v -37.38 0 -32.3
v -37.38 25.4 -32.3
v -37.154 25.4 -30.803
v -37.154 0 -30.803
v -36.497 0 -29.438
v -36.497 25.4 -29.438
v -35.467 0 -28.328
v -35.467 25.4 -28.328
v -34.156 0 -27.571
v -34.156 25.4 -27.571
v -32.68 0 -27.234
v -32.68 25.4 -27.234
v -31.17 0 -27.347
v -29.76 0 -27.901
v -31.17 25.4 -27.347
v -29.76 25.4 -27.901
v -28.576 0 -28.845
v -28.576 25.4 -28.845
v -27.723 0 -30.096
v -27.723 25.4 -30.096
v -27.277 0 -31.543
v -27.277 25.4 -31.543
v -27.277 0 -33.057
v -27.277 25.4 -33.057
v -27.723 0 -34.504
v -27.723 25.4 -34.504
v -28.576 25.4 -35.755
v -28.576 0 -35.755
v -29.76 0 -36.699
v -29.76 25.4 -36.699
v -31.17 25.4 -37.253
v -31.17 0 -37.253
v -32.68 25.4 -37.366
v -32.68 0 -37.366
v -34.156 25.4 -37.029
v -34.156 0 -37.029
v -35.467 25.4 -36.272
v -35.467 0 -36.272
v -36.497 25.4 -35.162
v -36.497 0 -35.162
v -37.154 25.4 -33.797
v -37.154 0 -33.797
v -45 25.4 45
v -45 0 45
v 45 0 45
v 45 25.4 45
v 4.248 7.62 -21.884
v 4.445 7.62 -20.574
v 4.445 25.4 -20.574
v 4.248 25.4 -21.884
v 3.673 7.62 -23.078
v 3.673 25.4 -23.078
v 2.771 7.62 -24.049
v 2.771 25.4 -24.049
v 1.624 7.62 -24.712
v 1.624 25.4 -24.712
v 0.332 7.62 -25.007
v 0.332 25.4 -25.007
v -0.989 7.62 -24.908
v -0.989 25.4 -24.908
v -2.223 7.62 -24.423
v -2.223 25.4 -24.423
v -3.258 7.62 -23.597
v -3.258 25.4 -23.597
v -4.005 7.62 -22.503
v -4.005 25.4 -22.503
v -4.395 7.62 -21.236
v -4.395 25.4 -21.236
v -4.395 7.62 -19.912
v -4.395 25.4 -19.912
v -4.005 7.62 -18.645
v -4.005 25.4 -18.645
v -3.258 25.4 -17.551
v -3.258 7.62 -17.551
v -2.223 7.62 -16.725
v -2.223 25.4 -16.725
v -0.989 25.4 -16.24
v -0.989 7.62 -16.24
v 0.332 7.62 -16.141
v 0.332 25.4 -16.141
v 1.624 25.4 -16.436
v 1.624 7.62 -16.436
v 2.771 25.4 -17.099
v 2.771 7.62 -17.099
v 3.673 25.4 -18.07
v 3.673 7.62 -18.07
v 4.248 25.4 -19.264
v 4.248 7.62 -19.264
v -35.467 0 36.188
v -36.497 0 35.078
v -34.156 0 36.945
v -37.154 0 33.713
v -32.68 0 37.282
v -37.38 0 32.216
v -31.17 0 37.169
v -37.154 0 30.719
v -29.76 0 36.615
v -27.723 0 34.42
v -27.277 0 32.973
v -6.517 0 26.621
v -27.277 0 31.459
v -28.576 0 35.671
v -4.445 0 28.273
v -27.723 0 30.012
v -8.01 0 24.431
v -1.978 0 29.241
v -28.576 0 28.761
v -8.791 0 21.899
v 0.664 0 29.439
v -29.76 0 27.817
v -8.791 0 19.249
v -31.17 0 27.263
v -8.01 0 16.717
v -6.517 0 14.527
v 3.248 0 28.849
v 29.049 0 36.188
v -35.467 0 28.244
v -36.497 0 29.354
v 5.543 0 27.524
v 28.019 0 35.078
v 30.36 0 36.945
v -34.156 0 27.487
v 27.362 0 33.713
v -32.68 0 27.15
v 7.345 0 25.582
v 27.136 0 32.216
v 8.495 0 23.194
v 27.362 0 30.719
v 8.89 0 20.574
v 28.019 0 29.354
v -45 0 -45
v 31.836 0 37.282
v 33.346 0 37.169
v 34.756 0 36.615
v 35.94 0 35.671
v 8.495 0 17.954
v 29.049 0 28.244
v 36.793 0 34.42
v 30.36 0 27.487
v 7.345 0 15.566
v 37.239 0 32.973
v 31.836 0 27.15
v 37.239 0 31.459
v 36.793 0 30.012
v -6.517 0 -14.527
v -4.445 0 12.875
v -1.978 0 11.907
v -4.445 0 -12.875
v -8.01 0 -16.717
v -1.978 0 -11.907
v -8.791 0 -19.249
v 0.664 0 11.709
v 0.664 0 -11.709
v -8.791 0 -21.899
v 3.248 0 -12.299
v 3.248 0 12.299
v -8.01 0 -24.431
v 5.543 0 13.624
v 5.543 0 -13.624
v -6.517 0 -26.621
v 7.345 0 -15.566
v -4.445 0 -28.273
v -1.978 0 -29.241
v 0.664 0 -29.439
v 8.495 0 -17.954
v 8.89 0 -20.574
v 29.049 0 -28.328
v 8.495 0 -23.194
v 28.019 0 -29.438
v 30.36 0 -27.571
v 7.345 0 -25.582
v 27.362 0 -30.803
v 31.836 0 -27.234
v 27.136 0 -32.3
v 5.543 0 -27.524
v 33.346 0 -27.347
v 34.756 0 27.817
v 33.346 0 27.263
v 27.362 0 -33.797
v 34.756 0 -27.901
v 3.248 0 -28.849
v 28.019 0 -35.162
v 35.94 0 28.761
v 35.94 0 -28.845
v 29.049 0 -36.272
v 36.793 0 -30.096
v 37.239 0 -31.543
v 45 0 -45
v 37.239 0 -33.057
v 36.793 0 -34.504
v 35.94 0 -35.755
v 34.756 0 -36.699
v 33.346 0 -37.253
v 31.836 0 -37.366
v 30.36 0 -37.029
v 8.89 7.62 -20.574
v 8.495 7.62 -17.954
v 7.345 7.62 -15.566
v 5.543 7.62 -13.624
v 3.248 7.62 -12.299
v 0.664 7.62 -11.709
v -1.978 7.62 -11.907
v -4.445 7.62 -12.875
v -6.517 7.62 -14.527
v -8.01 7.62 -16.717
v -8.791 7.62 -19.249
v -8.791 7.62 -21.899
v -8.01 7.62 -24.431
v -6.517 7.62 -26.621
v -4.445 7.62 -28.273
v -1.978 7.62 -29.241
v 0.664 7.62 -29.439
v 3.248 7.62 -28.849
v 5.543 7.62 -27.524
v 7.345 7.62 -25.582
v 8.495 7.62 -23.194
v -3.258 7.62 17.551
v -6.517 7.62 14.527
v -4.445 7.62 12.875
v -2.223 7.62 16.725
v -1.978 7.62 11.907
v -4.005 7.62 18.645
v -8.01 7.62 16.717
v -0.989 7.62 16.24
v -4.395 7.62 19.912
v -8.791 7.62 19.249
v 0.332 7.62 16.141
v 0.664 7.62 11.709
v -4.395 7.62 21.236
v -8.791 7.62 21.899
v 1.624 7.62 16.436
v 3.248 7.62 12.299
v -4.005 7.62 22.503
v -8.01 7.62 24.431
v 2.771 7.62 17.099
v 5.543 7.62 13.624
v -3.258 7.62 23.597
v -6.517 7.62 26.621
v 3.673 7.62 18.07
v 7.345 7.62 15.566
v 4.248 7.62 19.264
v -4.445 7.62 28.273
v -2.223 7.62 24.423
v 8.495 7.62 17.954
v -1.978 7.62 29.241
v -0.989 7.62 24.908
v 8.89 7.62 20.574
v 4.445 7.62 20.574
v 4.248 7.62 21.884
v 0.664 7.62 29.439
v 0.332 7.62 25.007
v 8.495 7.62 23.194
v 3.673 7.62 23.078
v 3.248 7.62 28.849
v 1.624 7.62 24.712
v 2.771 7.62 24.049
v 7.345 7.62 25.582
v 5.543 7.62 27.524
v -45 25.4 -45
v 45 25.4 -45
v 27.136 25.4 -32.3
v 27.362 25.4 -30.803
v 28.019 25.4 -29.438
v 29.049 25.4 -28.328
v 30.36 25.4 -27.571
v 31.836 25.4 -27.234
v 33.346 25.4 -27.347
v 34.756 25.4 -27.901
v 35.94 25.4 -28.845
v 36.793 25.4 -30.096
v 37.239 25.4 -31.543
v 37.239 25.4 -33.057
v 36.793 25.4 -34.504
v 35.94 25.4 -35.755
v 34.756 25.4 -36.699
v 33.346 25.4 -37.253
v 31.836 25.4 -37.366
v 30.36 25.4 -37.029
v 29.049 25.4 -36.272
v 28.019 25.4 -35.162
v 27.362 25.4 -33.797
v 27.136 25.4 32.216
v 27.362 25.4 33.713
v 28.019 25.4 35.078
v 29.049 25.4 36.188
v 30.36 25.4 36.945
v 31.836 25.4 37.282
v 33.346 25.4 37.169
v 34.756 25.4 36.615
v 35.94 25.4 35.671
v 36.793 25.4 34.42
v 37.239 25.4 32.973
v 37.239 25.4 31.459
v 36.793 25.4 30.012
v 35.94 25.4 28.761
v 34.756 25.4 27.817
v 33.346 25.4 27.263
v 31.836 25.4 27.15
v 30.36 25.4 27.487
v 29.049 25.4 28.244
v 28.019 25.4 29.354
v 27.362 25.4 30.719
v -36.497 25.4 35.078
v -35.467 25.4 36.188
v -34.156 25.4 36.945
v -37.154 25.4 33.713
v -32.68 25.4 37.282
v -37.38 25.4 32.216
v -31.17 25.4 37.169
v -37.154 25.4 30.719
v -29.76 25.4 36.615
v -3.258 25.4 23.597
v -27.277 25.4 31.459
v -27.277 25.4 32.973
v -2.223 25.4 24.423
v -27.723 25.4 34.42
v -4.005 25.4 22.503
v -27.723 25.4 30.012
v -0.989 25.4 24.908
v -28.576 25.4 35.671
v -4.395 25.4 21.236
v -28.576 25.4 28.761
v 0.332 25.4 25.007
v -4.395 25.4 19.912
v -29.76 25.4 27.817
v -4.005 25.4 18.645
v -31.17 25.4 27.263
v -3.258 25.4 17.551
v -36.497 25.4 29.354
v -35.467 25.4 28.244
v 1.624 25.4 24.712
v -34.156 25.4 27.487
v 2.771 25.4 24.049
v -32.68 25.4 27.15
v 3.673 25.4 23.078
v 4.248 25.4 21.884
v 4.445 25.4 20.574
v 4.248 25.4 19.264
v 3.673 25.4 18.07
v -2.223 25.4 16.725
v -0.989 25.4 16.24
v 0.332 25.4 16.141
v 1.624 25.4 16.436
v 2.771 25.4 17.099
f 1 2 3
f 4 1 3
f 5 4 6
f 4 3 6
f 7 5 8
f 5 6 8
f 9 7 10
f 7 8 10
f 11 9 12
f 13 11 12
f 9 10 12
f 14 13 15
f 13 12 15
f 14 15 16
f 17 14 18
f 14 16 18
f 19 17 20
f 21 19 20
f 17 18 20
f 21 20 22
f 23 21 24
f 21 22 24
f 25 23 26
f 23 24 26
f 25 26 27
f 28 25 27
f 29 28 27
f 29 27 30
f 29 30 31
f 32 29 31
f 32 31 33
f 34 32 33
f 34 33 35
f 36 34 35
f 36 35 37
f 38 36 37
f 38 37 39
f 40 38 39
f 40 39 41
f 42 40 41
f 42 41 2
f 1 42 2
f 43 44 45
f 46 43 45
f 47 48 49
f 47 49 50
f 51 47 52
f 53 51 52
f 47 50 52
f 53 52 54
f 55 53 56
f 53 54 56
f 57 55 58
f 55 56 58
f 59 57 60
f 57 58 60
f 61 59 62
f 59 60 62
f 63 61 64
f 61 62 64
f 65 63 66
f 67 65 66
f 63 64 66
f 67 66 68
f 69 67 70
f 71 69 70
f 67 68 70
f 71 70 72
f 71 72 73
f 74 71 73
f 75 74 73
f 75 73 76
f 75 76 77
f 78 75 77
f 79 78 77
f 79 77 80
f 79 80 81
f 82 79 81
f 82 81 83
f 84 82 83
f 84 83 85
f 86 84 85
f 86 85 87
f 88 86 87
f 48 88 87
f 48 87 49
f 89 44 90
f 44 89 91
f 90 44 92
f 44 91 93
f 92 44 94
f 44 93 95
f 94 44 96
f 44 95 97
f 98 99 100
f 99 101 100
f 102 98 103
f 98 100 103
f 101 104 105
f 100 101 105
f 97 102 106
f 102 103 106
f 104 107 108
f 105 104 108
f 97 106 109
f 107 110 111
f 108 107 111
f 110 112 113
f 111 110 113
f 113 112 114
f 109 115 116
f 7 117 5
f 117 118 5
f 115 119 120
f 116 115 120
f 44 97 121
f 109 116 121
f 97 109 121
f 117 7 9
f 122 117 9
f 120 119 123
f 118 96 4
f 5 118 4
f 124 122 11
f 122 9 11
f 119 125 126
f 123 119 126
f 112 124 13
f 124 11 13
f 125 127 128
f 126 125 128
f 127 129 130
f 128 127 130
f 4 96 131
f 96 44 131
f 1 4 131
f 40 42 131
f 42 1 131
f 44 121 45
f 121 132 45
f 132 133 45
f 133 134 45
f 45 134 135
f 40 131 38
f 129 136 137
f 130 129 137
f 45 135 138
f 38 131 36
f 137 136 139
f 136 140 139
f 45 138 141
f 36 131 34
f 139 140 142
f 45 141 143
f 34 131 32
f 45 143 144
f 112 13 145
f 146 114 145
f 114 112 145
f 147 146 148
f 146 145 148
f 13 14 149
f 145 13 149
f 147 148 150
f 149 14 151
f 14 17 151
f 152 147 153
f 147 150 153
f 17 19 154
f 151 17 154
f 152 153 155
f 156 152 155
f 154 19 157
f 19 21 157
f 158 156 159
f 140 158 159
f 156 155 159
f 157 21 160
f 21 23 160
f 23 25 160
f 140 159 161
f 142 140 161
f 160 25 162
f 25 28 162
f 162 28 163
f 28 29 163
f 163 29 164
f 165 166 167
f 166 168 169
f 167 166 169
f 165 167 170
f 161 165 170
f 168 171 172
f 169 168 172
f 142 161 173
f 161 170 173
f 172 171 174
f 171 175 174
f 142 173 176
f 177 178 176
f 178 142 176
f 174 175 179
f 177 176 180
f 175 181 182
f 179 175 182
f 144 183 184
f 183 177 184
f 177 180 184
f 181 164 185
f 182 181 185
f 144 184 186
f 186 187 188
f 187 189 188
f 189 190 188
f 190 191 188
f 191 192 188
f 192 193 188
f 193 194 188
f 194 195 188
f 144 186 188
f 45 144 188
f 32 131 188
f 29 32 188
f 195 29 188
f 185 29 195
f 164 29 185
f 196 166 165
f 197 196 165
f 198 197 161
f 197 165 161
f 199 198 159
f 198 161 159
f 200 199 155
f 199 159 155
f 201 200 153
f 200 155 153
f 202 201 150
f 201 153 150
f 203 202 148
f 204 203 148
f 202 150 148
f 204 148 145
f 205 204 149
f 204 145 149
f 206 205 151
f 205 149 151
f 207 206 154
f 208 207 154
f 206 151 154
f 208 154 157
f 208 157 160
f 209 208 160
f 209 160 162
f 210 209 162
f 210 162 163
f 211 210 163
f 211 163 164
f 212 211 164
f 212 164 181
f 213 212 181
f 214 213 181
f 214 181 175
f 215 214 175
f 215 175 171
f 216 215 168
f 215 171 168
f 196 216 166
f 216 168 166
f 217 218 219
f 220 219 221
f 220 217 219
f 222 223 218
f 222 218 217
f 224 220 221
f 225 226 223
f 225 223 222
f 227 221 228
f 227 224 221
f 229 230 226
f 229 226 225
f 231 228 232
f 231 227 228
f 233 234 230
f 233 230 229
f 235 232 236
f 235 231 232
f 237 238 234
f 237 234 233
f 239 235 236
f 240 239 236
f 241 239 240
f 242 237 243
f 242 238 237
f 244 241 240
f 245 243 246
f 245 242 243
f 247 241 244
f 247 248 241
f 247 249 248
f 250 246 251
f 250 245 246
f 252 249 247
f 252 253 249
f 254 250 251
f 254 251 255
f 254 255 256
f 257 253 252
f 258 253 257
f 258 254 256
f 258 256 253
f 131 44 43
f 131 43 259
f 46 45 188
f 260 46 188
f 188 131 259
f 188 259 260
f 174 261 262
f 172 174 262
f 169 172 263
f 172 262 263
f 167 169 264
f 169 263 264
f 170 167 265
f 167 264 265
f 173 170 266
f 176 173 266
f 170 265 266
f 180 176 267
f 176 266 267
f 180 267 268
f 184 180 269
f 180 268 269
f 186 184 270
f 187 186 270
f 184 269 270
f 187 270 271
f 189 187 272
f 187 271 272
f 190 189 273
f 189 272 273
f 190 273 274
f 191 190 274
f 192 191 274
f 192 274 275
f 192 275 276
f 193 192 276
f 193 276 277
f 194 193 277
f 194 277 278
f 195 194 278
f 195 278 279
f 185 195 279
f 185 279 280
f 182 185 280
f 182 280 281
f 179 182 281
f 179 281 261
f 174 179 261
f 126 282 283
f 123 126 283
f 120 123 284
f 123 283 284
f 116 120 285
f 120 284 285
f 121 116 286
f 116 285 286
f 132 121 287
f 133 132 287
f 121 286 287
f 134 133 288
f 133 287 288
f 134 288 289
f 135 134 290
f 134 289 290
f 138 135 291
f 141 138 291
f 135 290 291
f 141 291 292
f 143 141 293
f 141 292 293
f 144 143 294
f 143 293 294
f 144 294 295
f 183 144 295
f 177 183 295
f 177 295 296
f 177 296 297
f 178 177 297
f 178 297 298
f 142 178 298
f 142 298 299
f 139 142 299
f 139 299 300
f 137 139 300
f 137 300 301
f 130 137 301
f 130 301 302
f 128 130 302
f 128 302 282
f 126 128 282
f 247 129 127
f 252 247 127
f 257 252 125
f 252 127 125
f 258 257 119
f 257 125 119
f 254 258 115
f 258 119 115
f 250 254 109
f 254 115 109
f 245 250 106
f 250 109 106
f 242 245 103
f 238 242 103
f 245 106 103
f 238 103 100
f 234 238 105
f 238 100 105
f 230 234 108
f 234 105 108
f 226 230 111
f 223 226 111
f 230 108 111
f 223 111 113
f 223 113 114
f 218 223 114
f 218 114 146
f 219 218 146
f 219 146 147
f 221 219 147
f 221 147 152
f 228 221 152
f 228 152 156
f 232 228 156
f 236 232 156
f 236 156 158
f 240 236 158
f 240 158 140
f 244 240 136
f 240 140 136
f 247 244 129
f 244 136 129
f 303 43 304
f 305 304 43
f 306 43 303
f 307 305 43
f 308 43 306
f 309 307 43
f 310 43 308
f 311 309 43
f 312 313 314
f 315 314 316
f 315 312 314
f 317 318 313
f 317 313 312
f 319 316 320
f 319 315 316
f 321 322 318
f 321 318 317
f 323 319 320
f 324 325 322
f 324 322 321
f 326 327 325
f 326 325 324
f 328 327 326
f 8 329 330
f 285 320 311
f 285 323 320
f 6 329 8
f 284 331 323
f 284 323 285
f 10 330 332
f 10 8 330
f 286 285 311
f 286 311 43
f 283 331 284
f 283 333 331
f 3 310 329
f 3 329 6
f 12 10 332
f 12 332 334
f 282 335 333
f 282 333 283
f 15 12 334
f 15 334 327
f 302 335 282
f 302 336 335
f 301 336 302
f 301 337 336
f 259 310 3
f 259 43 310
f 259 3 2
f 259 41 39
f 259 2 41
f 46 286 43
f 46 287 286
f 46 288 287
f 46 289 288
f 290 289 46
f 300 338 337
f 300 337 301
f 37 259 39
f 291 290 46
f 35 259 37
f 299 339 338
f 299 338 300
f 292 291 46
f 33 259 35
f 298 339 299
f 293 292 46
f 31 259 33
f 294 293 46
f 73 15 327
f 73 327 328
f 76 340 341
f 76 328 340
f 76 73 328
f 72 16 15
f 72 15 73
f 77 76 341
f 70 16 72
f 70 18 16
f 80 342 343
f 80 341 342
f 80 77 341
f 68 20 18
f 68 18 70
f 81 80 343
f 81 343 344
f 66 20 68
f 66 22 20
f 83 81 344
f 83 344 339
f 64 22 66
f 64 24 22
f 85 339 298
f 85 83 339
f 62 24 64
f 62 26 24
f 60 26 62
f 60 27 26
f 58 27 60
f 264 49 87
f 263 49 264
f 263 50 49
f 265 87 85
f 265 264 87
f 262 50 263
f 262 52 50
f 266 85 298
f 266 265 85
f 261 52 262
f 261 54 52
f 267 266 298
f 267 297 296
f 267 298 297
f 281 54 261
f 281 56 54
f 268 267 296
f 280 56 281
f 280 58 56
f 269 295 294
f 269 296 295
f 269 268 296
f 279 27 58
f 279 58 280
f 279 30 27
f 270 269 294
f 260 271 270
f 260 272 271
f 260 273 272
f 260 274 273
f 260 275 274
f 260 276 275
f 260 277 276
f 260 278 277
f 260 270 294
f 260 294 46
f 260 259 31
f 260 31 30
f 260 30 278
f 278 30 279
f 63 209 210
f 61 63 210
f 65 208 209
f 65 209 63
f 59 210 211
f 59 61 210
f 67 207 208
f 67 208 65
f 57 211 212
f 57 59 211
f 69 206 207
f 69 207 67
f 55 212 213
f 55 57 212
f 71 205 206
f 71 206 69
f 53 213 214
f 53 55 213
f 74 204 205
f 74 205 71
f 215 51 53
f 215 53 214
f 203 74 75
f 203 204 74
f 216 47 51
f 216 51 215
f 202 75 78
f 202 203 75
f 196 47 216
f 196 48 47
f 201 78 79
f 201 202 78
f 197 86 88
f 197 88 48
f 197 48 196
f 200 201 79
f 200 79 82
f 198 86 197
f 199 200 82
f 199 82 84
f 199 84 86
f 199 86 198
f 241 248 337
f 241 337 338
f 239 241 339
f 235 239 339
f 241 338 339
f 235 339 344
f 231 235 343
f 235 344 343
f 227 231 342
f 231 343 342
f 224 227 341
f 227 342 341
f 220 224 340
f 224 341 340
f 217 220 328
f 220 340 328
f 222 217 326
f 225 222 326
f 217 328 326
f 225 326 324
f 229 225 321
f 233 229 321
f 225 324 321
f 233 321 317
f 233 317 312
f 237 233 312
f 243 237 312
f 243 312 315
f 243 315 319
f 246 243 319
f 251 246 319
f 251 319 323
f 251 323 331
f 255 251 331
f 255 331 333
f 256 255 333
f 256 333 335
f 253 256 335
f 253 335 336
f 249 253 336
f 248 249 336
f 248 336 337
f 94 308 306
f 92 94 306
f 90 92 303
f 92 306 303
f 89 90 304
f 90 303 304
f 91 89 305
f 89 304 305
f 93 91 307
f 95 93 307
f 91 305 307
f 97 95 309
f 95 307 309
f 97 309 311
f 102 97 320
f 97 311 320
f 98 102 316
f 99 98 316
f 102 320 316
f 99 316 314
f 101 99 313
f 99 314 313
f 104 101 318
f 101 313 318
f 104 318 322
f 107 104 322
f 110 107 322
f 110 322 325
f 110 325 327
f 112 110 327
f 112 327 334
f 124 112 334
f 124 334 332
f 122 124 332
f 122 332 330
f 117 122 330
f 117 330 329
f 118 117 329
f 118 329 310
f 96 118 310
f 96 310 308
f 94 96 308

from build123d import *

# Parameters (mm, degrees)
SKETCH1_W            = 90
SKETCH1_H            = 90
BOSS_EXTRUDE1_DEPTH  = 25.4
SKETCH2_R            = 5.08
CUT_EXTRUDE1_DEPTH   = 50.8
LPATTERN1_COUNT      = 2
LPATTERN1_PITCH      = 64.516
LPATTERN1_COUNT_DIR2 = 2
LPATTERN1_PITCH_DIR2 = 64.516
SKETCH4_R            = 4.445
CUT_EXTRUDE3_DEPTH   = 26.4
SKETCH5_R            = 8.89
CUT_EXTRUDE4_DEPTH   = 7.62


with BuildPart() as part:
    # Sketch1 → Boss-Extrude1 (new body)
    with BuildSketch(Plane(origin=(0, 0, 0), x_dir=(1, 0, 0), z_dir=(0, 1, 0))):
        Rectangle(SKETCH1_W, SKETCH1_H)
    extrude(amount=BOSS_EXTRUDE1_DEPTH)

    # Sketch2 → Cut-Extrude1 (cut)
    with BuildSketch(Plane(origin=(0, 25.4, 0), x_dir=(-1, 0, 0), z_dir=(0, 1, 0))):
        with Locations((32.3, -32.3)):
            Circle(SKETCH2_R)
    cut_extrude1 = extrude(amount=-CUT_EXTRUDE1_DEPTH, mode=Mode.SUBTRACT)

    # LPattern1: Cut-Extrude1 2 × 2
    with Locations(*[(i * LPATTERN1_PITCH, 0, j * LPATTERN1_PITCH_DIR2) for i in range(LPATTERN1_COUNT) for j in range(LPATTERN1_COUNT_DIR2) if (i, j) != (0, 0)]):
        add(cut_extrude1, mode=Mode.SUBTRACT)

    # Sketch4 → Cut-Extrude3 (cut, through all)
    with BuildSketch(Plane(origin=(0, 25.4, 0), x_dir=(1, 0, 0), z_dir=(0, 1, 0))):
        with Locations((0, 20.574)):
            Circle(SKETCH4_R)
        with Locations((0, -20.574)):
            Circle(SKETCH4_R)
    extrude(amount=-CUT_EXTRUDE3_DEPTH, mode=Mode.SUBTRACT)

    # Sketch5 → Cut-Extrude4 (cut)
    with BuildSketch(Plane.XZ):
        with Locations((0, -20.574)):
            Circle(SKETCH5_R)
        with Locations((0, 20.574)):
            Circle(SKETCH5_R)
    extrude(amount=-CUT_EXTRUDE4_DEPTH, mode=Mode.SUBTRACT)


solid = part.part
